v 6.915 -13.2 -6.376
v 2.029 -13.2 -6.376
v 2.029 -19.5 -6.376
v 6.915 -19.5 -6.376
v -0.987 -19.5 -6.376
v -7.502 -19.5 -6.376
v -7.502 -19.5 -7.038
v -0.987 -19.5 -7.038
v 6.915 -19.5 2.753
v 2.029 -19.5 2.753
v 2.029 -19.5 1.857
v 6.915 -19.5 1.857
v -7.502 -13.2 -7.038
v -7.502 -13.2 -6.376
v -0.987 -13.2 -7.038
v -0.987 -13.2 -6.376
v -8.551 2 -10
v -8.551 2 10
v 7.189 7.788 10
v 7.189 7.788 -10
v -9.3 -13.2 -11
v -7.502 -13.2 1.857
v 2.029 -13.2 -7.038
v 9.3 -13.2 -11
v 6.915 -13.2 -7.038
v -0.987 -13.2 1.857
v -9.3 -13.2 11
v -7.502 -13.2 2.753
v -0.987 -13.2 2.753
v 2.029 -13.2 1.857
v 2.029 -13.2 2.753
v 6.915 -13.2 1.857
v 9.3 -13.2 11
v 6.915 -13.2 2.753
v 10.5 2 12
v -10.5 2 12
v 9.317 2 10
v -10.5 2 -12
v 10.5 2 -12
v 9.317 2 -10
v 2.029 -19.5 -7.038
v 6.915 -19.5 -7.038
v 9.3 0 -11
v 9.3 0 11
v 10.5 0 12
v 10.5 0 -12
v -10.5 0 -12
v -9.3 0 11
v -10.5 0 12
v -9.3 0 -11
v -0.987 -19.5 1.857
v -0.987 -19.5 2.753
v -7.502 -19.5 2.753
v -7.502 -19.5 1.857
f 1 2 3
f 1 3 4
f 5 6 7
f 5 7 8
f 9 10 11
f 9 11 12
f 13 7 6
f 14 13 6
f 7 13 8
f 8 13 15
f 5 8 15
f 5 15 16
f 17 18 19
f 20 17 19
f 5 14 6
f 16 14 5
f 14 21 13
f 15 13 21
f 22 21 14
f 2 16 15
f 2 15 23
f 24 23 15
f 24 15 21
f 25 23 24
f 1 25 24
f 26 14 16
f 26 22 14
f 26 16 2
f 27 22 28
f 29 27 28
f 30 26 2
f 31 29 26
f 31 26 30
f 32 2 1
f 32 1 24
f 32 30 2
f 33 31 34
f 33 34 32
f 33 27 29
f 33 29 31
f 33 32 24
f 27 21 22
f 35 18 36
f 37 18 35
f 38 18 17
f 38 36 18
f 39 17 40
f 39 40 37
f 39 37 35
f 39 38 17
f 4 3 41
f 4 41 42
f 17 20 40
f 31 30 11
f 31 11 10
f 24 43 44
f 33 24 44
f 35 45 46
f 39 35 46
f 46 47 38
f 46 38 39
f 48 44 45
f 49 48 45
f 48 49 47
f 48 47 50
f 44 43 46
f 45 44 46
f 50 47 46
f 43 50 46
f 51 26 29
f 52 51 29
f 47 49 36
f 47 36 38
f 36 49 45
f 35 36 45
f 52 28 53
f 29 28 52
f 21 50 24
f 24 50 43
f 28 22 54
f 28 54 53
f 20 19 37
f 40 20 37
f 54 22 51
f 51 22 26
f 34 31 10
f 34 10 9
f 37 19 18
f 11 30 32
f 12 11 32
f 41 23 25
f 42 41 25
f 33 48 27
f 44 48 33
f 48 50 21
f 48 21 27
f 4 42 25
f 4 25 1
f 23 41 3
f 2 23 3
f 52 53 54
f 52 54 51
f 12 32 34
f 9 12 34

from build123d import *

# Parameters (mm, degrees)
SKETCH1_W           = 21
SKETCH1_H           = 24
BOSS_EXTRUDE1_DEPTH = 2
SKETCH2_W           = 18.6
SKETCH2_H           = 22
BOSS_EXTRUDE2_DEPTH = 13.2
SKETCH3_W           = 4.885548906
SKETCH3_H           = 0.896605201
SKETCH3_H_2         = 0.661547926
SKETCH3_W_2         = 6.515688333
BOSS_EXTRUDE3_DEPTH = 6.3
BOSS_EXTRUDE4_DEPTH = 10


with BuildPart() as part:
    # Sketch1 → Boss-Extrude1 (new body)
    with BuildSketch(Plane(origin=(0, 0, 0), x_dir=(1, 0, 0), z_dir=(0, 1, 0))):
        Rectangle(SKETCH1_W, SKETCH1_H)
    extrude(amount=BOSS_EXTRUDE1_DEPTH)

    # Sketch2 → Boss-Extrude2 (add)
    with BuildSketch(Plane.XZ):
        Rectangle(SKETCH2_W, SKETCH2_H)
    extrude(amount=BOSS_EXTRUDE2_DEPTH)

    # Sketch3 → Boss-Extrude3 (add)
    with BuildSketch(Plane.XZ.offset(13.2)):
        with Locations((4.472159413, 2.304982967)):
            Rectangle(SKETCH3_W, SKETCH3_H)
        with Locations((4.472159413, -6.706929347)):
            Rectangle(SKETCH3_W, SKETCH3_H_2)
        with Locations((-4.244383184, -6.706929347)):
            Rectangle(SKETCH3_W_2, SKETCH3_H_2)
        with Locations((-4.244383184, 2.304982967)):
            Rectangle(SKETCH3_W_2, SKETCH3_H)
    extrude(amount=BOSS_EXTRUDE3_DEPTH)

    # Sketch4 → Boss-Extrude4 (add, symmetric)
    with BuildSketch(Plane.XY):
        Polygon((-8.803379904, 1.907067214), (7.189360766, 7.787523085), (9.380607332, 1.828114693), align=None)
    extrude(amount=BOSS_EXTRUDE4_DEPTH, both=True)


solid = part.part
